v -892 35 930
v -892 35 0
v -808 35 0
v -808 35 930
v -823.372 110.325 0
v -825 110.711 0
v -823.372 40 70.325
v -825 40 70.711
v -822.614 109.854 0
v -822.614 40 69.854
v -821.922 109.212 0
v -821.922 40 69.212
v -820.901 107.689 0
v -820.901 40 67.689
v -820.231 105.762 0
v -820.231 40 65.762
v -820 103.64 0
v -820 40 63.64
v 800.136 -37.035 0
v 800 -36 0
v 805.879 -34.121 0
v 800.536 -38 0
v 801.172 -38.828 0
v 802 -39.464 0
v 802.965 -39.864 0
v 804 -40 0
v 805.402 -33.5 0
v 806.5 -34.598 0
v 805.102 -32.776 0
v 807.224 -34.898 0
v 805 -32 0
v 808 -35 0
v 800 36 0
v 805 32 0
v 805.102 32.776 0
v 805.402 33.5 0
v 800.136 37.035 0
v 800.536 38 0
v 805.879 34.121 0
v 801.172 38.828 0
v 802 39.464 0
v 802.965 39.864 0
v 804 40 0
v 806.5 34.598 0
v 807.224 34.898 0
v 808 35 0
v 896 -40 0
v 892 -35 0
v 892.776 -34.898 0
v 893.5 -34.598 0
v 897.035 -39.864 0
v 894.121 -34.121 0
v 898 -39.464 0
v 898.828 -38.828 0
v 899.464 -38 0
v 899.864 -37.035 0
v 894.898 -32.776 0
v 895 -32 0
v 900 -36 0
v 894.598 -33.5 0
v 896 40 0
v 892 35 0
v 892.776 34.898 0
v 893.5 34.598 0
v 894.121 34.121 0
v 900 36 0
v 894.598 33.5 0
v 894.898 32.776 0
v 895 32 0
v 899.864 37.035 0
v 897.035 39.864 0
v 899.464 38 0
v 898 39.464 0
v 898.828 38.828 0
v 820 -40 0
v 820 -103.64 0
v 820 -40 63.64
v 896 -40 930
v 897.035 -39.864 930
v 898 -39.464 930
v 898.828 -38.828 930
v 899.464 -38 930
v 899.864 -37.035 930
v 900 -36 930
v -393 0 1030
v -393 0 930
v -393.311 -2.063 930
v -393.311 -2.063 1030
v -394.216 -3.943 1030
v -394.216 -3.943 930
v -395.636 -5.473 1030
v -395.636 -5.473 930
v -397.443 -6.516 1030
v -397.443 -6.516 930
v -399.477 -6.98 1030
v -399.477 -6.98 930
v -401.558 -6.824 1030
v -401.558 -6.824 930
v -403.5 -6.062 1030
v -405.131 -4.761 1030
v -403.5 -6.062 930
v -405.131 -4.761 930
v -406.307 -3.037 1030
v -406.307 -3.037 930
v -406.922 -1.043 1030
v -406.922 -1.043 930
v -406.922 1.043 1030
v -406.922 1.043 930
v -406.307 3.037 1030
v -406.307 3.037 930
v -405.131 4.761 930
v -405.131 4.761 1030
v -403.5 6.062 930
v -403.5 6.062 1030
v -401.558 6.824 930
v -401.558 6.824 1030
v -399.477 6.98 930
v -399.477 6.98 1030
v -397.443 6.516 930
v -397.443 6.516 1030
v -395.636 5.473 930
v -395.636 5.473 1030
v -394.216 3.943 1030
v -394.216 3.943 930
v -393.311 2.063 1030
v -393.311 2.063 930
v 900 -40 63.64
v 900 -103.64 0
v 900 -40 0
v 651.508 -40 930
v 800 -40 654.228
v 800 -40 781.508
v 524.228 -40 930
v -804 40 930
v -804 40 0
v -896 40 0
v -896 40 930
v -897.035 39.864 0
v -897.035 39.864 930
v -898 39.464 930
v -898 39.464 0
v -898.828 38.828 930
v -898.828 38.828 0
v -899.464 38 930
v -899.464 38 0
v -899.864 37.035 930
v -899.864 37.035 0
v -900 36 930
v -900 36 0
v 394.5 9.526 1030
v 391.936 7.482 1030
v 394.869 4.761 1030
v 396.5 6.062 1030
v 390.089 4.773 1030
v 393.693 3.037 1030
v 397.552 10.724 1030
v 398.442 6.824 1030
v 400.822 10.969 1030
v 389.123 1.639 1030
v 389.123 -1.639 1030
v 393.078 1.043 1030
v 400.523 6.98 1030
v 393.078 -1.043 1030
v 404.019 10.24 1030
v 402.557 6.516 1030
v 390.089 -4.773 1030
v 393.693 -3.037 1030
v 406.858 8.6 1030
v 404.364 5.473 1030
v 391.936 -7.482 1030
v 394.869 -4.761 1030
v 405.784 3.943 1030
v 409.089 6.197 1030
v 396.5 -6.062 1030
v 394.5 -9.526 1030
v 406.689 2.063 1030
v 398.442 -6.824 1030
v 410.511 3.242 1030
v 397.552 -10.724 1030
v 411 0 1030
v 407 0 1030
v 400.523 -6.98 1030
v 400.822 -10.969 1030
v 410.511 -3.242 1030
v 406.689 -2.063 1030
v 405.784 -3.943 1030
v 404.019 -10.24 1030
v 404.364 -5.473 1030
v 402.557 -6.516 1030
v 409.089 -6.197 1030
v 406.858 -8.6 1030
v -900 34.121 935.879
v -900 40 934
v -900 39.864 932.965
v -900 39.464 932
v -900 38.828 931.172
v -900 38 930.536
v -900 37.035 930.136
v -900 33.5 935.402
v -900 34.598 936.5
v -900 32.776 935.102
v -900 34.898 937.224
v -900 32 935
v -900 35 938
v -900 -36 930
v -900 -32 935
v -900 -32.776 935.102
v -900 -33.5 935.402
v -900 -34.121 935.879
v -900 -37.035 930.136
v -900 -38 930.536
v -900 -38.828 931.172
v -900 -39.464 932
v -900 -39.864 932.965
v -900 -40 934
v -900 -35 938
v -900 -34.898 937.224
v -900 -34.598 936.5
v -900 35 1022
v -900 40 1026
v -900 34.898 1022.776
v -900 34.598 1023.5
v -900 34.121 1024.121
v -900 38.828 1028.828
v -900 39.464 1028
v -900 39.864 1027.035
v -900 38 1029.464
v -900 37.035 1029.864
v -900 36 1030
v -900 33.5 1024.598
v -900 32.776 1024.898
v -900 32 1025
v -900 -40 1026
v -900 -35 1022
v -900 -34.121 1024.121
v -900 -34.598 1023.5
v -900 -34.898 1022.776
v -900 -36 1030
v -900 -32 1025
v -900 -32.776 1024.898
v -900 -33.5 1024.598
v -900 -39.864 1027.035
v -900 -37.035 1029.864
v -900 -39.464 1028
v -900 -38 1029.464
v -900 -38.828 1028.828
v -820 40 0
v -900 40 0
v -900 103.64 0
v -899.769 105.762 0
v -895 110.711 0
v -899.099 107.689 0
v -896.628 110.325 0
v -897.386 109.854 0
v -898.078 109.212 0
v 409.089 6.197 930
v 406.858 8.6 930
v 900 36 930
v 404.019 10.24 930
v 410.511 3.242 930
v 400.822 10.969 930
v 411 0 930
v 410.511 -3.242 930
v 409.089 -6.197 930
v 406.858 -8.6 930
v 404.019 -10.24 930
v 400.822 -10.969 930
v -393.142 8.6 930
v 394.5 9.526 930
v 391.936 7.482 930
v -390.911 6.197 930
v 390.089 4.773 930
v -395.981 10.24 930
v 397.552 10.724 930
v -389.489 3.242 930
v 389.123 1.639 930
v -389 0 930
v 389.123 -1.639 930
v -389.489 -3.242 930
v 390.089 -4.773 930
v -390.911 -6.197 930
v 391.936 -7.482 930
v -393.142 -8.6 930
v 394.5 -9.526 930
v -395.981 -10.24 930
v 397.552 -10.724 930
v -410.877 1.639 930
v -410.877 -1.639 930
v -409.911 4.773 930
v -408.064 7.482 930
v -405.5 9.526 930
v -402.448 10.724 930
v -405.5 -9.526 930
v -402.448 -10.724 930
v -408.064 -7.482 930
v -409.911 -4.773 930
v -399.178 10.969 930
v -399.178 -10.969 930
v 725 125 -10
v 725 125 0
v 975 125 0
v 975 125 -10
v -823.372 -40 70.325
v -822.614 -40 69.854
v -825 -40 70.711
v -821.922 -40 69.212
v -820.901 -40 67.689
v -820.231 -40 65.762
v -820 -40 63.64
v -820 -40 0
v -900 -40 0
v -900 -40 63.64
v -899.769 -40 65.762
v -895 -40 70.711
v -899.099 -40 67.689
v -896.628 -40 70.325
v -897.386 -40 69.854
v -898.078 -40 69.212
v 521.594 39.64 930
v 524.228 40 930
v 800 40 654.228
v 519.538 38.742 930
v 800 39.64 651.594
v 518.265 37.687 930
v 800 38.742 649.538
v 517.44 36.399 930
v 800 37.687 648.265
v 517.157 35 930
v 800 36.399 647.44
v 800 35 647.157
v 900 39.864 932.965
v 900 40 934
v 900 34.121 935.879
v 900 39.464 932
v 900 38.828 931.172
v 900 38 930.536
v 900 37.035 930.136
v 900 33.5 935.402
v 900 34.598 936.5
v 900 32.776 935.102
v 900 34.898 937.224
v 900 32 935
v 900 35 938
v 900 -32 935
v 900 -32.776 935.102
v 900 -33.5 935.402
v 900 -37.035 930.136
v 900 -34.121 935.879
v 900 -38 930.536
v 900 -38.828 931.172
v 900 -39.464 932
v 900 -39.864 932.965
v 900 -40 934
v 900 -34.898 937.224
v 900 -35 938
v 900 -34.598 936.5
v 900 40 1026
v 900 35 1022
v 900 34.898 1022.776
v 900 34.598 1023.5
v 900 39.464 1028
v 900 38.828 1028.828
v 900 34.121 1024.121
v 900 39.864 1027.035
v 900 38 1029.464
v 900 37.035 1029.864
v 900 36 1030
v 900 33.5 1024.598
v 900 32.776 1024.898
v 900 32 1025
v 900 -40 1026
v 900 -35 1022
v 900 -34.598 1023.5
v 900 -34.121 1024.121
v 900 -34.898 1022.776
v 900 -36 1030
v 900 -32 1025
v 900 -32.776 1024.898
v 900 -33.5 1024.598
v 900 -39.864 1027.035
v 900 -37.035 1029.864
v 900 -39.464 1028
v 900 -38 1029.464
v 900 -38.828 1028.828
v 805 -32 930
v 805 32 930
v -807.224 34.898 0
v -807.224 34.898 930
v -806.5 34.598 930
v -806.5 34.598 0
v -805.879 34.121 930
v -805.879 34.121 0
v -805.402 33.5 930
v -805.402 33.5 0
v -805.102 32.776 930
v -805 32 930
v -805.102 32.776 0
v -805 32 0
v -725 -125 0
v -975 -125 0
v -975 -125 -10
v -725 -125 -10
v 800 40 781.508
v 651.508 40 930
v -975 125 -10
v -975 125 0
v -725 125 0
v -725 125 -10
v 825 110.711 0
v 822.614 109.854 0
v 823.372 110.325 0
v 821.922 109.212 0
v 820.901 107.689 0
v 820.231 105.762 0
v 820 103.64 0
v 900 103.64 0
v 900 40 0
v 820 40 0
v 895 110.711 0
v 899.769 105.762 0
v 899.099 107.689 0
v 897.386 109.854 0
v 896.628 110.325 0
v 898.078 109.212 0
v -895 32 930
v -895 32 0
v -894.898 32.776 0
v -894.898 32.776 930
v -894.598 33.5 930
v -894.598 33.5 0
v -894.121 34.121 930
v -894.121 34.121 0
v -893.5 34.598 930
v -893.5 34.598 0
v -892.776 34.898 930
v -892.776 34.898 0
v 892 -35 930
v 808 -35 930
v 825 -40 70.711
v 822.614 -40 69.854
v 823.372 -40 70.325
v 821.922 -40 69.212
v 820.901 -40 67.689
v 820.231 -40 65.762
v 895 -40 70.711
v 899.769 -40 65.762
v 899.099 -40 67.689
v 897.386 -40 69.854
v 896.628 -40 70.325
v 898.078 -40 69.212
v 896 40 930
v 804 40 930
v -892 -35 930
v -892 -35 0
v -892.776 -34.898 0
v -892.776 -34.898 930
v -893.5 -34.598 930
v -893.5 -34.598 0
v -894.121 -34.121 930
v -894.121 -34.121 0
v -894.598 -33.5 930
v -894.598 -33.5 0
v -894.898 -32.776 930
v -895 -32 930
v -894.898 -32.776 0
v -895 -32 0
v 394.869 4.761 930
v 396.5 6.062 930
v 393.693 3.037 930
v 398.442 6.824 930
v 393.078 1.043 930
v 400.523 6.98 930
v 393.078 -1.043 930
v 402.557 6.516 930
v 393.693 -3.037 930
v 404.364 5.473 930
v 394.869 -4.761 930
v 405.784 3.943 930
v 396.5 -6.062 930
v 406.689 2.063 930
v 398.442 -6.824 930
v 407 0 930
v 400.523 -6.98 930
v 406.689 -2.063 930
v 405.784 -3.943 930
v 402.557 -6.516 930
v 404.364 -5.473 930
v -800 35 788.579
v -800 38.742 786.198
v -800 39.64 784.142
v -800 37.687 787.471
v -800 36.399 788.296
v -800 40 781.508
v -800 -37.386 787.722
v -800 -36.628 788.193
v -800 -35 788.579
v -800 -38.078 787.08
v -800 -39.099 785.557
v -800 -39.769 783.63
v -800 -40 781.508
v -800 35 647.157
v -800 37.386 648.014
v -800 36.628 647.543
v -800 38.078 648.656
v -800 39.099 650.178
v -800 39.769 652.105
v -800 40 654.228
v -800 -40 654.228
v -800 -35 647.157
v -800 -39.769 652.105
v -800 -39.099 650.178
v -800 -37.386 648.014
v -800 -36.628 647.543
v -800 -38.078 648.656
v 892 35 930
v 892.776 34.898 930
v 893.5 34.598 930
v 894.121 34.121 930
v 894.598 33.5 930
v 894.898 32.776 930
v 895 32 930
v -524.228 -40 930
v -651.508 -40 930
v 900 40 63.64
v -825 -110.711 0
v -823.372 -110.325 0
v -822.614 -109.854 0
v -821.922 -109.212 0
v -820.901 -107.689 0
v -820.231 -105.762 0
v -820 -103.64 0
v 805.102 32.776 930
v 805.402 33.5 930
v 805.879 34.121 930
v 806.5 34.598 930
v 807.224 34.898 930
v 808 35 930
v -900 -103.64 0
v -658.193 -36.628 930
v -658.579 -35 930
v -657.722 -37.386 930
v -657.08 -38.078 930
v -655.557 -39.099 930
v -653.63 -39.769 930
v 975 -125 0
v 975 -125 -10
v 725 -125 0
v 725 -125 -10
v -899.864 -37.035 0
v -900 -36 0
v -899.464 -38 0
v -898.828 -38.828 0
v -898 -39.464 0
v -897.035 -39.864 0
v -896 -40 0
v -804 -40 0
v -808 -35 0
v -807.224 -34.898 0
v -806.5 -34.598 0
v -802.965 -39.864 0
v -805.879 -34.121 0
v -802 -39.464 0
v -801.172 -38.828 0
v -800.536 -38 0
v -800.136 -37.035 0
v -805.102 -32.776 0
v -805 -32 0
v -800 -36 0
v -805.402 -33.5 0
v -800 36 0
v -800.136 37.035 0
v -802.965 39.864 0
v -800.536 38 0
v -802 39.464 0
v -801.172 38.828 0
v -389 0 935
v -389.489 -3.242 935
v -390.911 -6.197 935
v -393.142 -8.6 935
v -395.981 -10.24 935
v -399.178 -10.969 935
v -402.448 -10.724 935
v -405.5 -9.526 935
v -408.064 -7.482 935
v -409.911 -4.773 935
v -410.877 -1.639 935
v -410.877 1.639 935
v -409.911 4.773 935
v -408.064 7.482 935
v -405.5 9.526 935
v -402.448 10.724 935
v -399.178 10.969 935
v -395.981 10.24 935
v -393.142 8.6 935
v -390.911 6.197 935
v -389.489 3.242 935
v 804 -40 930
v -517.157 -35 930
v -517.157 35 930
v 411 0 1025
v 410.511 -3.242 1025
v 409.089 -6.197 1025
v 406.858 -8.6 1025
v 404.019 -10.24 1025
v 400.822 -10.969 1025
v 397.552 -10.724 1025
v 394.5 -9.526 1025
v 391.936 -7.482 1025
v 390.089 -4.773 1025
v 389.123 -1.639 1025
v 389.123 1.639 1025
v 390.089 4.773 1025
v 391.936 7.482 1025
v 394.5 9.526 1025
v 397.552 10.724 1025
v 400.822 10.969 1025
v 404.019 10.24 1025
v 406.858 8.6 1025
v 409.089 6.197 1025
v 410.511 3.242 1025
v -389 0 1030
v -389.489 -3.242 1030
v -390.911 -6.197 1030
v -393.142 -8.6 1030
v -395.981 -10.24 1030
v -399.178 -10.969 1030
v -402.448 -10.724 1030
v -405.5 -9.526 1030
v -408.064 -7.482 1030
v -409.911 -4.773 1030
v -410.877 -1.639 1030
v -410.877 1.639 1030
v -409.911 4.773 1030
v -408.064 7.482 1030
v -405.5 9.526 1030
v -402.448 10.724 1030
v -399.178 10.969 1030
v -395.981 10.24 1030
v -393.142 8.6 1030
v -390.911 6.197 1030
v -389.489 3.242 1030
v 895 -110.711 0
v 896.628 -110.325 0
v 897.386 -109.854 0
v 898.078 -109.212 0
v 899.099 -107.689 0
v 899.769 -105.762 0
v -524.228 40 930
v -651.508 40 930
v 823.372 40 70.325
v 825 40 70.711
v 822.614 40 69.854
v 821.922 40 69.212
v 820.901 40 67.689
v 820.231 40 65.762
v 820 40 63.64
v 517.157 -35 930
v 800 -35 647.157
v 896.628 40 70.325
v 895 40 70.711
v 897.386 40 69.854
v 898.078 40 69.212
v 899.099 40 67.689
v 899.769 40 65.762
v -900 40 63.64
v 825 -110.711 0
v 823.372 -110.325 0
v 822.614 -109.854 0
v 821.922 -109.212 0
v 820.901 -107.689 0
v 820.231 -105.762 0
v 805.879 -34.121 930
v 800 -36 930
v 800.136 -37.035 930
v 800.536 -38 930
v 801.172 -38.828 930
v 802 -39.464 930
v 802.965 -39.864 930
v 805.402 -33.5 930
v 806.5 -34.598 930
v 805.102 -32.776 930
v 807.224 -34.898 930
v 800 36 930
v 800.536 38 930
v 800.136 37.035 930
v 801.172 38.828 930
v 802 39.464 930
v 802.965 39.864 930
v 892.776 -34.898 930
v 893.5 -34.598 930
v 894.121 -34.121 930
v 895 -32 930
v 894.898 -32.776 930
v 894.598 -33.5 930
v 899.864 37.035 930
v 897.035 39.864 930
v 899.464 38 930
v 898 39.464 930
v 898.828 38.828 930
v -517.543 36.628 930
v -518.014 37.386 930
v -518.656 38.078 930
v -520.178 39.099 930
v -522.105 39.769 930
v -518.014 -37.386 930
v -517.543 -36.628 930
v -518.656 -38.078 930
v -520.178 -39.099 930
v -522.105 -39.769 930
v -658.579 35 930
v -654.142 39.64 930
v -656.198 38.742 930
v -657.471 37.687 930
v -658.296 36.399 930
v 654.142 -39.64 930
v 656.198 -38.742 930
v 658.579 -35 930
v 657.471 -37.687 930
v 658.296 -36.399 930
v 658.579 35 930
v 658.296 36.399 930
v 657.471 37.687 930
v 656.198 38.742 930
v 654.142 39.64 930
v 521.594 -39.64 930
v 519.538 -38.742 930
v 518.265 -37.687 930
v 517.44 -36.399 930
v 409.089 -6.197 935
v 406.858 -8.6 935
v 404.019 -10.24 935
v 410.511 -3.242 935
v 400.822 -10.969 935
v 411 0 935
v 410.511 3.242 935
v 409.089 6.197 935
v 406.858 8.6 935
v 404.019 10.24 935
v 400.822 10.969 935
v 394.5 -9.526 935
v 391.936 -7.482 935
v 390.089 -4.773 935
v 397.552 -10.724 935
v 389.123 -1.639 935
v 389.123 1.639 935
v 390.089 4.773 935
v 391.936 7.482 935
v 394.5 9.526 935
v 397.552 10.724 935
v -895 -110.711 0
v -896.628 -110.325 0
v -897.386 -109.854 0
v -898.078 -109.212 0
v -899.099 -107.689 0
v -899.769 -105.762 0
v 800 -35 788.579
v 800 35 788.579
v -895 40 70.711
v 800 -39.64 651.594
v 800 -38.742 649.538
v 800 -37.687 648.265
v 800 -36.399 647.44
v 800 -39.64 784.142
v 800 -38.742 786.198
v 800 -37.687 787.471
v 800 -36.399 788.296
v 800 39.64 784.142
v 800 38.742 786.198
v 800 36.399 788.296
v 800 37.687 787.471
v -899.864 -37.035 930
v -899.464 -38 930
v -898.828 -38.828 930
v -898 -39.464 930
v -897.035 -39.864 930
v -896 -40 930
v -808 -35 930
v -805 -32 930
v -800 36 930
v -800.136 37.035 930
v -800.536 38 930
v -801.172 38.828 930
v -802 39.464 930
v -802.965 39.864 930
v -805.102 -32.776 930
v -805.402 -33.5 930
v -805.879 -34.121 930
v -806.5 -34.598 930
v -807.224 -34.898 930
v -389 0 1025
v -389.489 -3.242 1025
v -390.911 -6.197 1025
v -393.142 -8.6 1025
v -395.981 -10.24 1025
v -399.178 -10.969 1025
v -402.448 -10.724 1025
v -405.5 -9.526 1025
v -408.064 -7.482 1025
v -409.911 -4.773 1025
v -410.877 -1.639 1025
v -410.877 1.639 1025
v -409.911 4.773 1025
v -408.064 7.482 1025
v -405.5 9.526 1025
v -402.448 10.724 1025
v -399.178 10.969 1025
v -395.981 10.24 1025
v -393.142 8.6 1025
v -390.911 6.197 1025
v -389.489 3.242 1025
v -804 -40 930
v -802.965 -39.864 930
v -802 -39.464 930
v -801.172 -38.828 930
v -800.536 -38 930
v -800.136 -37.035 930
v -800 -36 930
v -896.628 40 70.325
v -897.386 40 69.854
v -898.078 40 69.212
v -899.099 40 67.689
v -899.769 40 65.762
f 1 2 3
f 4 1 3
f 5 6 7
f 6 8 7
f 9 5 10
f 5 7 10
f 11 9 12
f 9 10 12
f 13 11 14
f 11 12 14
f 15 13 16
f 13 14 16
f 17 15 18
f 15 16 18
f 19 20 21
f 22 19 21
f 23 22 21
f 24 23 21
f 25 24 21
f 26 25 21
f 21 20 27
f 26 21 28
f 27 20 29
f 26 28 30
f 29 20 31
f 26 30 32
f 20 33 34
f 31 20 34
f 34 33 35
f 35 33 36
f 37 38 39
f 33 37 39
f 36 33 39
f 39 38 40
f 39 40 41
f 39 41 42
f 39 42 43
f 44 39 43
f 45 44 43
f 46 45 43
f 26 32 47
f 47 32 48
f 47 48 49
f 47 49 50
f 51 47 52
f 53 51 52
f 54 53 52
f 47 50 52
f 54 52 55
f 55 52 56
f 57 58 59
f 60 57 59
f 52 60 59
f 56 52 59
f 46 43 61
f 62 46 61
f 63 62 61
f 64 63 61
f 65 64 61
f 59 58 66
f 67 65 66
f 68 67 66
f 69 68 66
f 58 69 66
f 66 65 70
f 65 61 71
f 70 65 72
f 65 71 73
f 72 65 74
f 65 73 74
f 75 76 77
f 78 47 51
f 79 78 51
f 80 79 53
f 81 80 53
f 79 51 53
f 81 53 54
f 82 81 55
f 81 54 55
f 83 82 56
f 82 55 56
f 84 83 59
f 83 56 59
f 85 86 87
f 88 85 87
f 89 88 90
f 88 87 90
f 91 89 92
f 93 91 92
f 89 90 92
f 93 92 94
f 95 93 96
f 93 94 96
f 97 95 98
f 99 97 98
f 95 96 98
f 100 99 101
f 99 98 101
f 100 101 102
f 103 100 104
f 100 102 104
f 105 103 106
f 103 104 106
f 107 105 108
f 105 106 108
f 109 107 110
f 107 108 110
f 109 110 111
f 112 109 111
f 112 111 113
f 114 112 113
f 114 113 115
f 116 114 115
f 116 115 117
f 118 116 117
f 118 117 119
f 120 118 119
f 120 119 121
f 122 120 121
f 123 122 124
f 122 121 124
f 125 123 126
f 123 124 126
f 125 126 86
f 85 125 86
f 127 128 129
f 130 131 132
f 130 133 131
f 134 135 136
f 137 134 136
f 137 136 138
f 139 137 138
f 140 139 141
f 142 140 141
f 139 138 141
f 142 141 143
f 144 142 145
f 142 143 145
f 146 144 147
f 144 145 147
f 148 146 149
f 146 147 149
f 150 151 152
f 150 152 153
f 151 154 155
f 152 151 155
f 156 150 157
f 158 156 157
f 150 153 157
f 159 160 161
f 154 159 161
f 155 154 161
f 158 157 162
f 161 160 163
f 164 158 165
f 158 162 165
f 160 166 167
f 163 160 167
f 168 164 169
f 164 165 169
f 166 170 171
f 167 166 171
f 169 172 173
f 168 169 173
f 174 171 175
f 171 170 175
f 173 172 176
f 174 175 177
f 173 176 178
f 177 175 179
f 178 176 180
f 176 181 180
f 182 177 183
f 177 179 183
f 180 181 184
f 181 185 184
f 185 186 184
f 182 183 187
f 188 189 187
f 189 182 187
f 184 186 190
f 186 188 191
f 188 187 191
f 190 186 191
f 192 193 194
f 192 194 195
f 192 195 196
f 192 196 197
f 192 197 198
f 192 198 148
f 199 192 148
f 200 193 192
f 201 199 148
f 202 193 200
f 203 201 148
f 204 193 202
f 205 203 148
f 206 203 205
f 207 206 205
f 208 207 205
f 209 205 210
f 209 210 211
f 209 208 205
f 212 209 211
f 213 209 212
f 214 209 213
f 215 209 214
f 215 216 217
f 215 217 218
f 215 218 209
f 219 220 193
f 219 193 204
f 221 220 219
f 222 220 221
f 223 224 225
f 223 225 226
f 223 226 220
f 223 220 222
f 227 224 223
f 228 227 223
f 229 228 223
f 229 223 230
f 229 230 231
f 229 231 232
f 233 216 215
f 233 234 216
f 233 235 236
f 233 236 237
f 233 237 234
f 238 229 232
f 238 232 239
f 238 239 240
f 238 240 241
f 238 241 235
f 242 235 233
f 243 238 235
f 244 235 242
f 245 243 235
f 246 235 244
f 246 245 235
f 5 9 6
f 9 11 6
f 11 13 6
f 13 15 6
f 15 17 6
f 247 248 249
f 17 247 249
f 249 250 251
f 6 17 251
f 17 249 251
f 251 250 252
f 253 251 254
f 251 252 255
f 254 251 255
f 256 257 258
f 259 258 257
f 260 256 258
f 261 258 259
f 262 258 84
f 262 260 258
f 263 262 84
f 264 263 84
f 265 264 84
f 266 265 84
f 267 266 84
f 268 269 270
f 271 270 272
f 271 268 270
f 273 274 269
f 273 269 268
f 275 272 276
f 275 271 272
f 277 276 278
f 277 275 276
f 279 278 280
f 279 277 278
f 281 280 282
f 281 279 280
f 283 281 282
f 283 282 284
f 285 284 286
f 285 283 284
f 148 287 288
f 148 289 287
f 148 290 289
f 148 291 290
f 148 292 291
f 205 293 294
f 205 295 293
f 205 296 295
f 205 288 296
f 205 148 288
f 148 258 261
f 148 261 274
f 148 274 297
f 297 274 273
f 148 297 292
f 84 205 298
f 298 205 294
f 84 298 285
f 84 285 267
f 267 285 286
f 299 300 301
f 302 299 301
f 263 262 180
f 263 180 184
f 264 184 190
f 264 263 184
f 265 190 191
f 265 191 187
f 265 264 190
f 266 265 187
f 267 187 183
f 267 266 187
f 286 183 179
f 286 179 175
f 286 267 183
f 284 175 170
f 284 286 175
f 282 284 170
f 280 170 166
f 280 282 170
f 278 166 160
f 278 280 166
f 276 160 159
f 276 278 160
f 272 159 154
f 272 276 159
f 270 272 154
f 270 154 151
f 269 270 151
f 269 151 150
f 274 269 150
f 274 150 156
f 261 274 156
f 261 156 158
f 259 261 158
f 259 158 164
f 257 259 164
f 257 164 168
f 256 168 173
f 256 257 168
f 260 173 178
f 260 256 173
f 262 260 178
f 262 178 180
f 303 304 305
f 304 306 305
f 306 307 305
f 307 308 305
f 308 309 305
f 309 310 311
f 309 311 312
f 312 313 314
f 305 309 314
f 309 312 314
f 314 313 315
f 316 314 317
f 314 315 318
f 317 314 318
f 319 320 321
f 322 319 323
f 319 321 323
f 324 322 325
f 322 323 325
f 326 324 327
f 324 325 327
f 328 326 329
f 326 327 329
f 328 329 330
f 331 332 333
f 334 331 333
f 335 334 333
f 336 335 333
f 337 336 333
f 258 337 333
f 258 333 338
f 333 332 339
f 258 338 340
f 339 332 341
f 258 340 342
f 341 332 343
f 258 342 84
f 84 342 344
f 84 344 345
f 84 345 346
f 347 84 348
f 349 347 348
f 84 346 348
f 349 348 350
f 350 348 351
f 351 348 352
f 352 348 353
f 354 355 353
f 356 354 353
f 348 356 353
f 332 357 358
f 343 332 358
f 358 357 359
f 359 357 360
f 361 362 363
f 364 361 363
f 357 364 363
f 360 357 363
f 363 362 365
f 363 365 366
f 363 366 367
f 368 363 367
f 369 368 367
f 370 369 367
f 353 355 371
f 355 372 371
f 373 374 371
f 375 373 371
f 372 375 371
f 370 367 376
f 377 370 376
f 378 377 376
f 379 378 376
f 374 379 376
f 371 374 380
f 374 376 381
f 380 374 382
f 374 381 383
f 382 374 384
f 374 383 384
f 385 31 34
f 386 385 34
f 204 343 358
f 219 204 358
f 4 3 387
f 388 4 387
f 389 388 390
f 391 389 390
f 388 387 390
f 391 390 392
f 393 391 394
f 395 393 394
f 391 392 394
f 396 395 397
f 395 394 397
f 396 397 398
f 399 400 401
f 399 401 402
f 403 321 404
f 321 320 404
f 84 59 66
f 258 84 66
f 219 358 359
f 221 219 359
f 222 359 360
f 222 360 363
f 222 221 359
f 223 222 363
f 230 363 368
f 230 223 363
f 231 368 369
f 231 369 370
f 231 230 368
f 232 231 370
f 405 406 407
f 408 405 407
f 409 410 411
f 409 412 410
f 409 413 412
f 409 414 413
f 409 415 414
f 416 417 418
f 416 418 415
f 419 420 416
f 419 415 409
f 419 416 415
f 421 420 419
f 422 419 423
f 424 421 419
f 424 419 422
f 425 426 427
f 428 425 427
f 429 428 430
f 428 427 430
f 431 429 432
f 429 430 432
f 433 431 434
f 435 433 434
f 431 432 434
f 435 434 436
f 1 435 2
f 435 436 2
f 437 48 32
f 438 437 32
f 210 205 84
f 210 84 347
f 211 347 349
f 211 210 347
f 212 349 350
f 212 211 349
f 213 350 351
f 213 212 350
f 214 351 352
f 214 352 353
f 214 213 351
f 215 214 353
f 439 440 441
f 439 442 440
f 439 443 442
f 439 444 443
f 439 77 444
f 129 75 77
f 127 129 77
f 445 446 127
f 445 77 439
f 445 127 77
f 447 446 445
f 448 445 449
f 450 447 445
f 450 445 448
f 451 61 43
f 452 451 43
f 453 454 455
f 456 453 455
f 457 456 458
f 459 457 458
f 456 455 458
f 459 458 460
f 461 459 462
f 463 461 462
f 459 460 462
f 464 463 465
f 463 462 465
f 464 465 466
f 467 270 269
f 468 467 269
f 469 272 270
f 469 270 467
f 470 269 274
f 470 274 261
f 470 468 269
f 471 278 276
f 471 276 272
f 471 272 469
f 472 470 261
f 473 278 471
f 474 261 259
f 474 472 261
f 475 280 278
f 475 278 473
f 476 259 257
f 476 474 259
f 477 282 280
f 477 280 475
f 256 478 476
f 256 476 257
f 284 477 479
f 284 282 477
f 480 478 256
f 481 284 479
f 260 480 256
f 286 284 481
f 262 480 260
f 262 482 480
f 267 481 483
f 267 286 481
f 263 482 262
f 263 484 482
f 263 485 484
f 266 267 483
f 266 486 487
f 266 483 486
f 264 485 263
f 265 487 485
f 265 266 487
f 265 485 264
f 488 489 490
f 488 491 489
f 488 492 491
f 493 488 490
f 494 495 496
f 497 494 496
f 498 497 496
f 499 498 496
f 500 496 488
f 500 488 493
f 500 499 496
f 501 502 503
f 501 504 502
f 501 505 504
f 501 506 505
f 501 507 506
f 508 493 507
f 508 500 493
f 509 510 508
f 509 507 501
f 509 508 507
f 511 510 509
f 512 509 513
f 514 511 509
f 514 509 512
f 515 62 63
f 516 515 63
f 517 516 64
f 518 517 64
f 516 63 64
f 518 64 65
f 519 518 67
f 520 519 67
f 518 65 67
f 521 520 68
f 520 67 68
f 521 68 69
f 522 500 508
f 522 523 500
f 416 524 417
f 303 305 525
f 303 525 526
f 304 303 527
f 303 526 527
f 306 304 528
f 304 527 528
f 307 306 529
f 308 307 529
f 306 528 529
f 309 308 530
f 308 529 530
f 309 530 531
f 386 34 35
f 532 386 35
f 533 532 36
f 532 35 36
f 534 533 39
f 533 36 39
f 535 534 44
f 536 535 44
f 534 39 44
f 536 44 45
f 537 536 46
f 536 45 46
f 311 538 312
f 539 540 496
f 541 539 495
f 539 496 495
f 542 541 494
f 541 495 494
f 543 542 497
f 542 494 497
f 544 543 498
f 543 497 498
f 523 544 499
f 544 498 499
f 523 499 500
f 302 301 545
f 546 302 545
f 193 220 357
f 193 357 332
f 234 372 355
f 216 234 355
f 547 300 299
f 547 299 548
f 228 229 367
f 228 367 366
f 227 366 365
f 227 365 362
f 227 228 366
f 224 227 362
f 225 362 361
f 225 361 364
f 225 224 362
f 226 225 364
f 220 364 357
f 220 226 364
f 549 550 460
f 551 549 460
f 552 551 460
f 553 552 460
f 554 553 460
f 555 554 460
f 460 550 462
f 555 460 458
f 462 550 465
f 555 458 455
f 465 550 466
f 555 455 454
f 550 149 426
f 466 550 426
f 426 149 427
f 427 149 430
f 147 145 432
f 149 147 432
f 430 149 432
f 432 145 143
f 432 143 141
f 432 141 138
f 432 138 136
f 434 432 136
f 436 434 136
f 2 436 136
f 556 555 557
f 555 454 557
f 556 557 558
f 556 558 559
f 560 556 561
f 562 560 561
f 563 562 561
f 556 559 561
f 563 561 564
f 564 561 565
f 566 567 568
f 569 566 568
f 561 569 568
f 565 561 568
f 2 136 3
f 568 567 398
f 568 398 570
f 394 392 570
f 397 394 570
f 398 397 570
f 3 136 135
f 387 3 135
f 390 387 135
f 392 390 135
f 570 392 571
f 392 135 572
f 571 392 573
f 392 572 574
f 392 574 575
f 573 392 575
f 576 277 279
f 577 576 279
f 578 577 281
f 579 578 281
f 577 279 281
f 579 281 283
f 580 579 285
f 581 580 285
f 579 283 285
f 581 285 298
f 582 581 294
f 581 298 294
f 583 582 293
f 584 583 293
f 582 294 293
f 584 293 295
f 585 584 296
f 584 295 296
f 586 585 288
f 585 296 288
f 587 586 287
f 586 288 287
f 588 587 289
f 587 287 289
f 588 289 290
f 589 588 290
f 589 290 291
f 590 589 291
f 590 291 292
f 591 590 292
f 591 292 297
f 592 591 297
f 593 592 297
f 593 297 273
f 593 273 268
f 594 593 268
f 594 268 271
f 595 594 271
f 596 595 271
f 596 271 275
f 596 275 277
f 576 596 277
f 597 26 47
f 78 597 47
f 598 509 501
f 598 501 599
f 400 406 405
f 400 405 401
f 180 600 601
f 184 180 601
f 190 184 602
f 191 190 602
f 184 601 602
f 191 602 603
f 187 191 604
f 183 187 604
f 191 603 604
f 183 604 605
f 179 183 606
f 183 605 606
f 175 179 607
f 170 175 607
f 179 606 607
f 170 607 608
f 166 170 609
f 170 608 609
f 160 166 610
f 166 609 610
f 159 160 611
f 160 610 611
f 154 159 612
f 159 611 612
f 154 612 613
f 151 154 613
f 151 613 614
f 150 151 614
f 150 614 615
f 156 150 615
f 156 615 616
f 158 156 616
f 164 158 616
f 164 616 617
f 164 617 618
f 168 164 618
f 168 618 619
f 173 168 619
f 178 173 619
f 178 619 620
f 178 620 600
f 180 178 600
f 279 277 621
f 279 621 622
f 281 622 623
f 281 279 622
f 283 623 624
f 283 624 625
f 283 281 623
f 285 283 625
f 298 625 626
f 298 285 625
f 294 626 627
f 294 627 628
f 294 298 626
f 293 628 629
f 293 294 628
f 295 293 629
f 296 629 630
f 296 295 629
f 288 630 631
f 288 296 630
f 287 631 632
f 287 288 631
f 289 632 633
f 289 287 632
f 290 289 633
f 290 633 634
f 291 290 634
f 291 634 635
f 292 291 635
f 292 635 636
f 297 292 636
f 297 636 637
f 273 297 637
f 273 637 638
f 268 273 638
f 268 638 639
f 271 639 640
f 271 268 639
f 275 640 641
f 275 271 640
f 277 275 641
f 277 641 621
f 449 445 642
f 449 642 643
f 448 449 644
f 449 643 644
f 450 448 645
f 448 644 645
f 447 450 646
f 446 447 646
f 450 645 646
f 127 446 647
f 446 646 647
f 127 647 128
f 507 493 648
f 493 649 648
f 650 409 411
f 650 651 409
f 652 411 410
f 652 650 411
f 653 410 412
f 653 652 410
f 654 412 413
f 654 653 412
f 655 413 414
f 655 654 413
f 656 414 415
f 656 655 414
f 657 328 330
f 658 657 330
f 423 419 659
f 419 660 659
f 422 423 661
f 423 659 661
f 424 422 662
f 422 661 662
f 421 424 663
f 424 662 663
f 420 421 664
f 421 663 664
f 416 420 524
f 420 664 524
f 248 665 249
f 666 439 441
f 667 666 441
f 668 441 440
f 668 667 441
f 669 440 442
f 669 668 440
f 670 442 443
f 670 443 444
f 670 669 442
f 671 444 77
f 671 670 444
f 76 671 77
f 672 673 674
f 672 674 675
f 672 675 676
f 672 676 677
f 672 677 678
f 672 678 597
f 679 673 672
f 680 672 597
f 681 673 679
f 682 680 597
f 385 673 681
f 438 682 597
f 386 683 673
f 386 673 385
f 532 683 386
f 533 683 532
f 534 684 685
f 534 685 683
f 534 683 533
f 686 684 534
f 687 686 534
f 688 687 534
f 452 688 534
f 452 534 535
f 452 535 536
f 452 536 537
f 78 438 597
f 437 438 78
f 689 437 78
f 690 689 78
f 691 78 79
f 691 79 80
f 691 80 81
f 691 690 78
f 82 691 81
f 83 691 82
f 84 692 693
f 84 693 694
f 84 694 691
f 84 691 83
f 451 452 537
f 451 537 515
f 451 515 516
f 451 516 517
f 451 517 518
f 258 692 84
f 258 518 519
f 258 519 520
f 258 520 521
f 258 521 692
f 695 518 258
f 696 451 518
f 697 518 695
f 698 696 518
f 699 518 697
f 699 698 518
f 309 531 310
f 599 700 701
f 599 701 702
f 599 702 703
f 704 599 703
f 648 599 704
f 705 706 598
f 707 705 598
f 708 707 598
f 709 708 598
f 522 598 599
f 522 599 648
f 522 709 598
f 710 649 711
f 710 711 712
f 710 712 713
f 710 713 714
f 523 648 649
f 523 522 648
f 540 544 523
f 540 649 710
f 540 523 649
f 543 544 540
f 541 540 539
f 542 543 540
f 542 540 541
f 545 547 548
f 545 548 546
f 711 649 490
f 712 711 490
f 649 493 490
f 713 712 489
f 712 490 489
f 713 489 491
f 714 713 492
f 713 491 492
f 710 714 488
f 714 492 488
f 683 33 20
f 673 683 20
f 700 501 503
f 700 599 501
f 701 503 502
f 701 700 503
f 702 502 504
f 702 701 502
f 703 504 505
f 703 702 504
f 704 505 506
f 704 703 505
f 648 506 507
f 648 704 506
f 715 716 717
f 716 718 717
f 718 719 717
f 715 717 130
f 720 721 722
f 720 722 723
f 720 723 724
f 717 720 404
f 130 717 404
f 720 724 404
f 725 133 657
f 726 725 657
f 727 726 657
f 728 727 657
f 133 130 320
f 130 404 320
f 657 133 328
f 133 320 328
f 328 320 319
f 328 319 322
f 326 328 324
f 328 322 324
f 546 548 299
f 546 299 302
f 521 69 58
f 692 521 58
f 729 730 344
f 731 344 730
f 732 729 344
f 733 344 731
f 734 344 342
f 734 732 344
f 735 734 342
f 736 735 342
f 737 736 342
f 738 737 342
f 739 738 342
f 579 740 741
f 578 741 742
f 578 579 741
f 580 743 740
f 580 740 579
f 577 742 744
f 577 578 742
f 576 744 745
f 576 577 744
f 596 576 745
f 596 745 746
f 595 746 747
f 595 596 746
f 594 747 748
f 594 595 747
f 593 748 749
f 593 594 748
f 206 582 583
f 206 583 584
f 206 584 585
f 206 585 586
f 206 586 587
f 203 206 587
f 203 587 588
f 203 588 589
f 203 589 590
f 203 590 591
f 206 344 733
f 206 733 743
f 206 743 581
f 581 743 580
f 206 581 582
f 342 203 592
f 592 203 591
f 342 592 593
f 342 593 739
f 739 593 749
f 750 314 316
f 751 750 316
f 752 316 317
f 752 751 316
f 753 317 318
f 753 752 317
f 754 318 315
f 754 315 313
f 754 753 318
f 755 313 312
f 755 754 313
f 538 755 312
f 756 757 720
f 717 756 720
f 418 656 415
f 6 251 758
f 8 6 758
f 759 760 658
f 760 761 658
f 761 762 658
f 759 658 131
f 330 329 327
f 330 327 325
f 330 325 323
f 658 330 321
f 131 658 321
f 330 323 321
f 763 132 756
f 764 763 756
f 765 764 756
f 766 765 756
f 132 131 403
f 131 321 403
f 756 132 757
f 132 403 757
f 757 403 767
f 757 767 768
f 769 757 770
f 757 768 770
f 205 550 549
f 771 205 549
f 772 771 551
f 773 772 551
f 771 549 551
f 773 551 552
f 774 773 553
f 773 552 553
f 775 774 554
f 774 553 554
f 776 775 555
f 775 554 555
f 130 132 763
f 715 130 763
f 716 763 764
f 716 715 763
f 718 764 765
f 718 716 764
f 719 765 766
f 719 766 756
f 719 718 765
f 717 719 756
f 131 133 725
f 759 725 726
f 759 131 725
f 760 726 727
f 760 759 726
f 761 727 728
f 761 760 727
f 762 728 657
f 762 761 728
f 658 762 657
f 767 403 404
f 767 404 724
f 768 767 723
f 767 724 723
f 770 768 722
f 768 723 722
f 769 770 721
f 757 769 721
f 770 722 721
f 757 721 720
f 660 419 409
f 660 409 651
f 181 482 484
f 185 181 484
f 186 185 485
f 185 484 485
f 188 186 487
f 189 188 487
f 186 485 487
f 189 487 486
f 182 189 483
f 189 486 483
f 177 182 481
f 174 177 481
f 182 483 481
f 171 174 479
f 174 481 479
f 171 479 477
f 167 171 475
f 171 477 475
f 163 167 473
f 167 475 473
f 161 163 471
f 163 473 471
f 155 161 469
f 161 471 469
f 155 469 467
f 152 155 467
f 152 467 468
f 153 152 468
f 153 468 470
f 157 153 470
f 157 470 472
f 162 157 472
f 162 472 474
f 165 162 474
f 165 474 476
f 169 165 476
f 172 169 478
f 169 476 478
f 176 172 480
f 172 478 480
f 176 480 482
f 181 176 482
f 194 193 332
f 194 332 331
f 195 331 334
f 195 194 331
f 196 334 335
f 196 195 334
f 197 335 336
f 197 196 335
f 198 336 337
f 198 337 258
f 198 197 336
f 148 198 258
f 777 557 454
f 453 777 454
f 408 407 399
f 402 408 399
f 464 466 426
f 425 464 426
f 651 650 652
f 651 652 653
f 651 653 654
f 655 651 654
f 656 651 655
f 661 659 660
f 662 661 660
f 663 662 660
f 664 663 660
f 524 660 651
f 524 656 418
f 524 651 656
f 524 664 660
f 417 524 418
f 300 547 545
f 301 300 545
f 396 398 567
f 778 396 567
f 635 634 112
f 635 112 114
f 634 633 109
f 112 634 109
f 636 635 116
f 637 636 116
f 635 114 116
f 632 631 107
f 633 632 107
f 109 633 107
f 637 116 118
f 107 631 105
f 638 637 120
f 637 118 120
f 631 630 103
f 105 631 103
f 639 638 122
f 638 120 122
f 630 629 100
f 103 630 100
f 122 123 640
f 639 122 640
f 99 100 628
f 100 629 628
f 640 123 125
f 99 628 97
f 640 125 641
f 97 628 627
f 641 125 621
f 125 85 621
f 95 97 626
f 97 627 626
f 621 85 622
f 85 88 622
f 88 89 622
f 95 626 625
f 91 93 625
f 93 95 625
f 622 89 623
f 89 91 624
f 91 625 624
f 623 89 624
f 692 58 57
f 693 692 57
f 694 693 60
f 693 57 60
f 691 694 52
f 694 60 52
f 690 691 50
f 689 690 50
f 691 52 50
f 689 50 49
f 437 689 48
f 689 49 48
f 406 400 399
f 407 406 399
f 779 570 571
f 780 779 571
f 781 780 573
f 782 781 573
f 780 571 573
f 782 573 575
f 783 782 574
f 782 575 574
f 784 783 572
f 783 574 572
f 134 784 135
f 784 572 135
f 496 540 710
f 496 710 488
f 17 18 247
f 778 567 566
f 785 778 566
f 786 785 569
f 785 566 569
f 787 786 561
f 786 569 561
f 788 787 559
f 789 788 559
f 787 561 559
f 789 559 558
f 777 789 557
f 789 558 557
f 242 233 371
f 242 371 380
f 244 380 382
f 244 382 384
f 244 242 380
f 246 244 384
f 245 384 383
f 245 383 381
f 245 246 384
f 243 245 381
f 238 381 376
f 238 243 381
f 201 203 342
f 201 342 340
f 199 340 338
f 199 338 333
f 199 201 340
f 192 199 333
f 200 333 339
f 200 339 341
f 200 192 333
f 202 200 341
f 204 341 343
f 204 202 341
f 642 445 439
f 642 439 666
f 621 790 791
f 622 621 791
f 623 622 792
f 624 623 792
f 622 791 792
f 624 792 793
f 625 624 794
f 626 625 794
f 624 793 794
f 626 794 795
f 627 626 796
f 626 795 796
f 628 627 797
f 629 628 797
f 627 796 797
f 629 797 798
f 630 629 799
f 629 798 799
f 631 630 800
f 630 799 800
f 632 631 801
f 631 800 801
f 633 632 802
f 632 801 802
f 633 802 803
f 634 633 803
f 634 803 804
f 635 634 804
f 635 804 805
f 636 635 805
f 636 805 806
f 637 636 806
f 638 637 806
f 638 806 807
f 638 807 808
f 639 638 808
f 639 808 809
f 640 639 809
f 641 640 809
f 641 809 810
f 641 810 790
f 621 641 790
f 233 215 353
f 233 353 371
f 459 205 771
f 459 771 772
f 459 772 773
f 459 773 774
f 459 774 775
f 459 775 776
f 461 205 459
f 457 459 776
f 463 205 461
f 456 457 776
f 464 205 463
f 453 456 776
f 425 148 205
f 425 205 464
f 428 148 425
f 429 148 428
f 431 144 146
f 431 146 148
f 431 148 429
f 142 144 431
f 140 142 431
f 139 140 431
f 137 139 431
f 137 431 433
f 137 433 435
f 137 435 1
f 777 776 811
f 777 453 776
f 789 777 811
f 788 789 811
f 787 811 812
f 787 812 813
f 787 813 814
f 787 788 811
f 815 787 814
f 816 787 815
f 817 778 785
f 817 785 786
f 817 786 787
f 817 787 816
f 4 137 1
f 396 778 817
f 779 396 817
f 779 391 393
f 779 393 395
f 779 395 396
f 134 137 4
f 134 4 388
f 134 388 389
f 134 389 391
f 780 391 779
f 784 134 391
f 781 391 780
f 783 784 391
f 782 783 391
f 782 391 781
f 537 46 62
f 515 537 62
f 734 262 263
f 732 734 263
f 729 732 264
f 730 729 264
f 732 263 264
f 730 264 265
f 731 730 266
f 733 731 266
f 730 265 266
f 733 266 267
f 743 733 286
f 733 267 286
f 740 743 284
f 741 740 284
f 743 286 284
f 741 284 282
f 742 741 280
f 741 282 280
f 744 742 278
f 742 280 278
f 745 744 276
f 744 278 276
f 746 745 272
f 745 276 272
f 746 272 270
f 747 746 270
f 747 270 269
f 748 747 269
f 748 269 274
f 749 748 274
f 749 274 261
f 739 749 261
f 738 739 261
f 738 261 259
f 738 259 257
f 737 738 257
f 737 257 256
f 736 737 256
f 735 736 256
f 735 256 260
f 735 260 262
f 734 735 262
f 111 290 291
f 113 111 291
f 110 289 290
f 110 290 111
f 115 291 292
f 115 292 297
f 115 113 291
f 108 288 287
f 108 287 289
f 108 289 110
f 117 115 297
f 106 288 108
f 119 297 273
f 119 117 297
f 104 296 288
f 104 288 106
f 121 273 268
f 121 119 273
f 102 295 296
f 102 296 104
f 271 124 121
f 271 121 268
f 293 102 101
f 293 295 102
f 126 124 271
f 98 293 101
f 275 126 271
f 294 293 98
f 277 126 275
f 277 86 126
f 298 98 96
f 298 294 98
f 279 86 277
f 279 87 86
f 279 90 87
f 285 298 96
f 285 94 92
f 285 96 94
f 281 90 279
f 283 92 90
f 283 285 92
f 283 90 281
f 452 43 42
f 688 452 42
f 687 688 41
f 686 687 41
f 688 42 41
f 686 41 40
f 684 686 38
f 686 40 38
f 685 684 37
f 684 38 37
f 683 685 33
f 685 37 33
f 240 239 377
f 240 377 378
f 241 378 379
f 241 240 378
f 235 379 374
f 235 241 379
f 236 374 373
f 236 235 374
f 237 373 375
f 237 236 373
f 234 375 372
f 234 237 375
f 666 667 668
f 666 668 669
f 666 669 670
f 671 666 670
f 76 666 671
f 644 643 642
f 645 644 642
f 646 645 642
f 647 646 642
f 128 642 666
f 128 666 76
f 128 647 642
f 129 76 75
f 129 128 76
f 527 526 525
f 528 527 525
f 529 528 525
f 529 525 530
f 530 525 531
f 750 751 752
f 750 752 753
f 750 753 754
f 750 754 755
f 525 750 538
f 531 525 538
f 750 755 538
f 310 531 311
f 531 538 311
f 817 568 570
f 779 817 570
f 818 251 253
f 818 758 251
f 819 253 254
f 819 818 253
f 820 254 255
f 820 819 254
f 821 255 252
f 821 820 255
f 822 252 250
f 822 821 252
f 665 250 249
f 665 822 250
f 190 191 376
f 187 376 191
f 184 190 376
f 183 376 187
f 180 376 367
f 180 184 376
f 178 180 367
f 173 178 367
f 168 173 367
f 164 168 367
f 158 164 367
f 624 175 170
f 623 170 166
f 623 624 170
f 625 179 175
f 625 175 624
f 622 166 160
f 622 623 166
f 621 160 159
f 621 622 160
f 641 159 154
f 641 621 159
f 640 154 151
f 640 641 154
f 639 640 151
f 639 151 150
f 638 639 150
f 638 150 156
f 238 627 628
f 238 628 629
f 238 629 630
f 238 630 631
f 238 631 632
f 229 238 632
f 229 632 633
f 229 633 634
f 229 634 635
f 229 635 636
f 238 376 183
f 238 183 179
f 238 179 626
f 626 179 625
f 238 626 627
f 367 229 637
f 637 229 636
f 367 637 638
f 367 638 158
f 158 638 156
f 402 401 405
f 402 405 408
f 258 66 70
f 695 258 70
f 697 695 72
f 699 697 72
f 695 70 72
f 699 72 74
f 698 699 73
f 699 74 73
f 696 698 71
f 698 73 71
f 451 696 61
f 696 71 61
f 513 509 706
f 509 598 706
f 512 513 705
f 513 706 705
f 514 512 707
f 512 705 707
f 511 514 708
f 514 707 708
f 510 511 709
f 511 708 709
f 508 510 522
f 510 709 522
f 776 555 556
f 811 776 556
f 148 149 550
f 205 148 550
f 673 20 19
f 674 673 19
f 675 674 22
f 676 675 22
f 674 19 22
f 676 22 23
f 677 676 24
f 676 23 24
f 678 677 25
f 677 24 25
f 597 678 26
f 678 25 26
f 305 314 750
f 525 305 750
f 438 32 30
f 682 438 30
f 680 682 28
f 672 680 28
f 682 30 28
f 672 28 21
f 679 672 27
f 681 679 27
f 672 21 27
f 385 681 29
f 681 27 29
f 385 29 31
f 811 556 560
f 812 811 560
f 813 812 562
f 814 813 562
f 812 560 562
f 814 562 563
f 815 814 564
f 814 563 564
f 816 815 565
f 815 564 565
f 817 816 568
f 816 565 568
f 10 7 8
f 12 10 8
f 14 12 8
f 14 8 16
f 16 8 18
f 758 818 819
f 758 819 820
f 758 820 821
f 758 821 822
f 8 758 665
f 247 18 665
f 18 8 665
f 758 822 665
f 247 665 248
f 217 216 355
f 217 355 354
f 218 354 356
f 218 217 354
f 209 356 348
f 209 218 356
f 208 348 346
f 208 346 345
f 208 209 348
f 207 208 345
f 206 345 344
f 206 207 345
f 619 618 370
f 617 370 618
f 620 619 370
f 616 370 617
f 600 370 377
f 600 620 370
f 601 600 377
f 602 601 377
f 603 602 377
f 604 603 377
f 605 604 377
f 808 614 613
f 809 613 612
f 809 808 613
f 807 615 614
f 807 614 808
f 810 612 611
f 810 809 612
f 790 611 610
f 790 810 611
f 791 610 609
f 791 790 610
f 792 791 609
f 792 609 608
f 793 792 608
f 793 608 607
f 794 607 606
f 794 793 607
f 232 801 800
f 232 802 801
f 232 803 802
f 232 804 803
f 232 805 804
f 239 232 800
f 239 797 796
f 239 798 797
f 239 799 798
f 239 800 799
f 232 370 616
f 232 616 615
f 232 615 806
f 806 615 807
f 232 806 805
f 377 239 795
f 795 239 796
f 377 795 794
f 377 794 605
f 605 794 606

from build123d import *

# Parameters (mm, degrees)
F1_DEPTH  = 930
F3_DEPTH  = 1800
F5_DEPTH  = 40
F6_R      = 5
F7_W      = 250
F7_H      = 250
F8_DEPTH  = 10
F10_DEPTH = 80
F11_R     = 5
F13_R     = 11
F14_DEPTH = 100
F15_R     = 11
F15_R_2   = 7
F16_DEPTH = 100
F17_R     = 5
F18_R     = 5


with BuildPart() as f1:
    # F0 (on Top) → F1 (new body)
    with BuildSketch(Plane.XY):
        with BuildLine():
            Line((-896, -40), (-804, -40))
            ThreePointArc((-804, -40), (-801.171573, -38.828427), (-800, -36))
            Line((-800, -36), (-800, 36))
            ThreePointArc((-800, 36), (-801.171573, 38.828427), (-804, 40))
            Line((-804, 40), (-896, 40))
            ThreePointArc((-896, 40), (-898.828427, 38.828427), (-900, 36))
            Line((-900, 36), (-900, -36))
            ThreePointArc((-900, -36), (-898.828427, -38.828427), (-896, -40))
        make_face()
        with BuildLine():
            ThreePointArc((-805, -32), (-805.87868, -34.12132), (-808, -35))
            Line((-808, -35), (-892, -35))
            ThreePointArc((-892, -35), (-894.12132, -34.12132), (-895, -32))
            Line((-895, -32), (-895, 32))
            ThreePointArc((-895, 32), (-894.12132, 34.12132), (-892, 35))
            Line((-892, 35), (-808, 35))
            ThreePointArc((-808, 35), (-805.87868, 34.12132), (-805, 32))
            Line((-805, 32), (-805, -32))
        make_face(mode=Mode.SUBTRACT)
        with BuildLine():
            ThreePointArc((804, 40), (801.171573, 38.828427), (800, 36))
            Line((800, 36), (800, -36))
            ThreePointArc((800, -36), (801.171573, -38.828427), (804, -40))
            Line((804, -40), (896, -40))
            ThreePointArc((896, -40), (898.828427, -38.828427), (900, -36))
            Line((900, -36), (900, 36))
            ThreePointArc((900, 36), (898.828427, 38.828427), (896, 40))
            Line((896, 40), (804, 40))
        make_face()
        with BuildLine():
            Line((892, -35), (808, -35))
            ThreePointArc((808, -35), (805.87868, -34.12132), (805, -32))
            Line((805, -32), (805, 32))
            ThreePointArc((805, 32), (805.87868, 34.12132), (808, 35))
            Line((808, 35), (892, 35))
            ThreePointArc((892, 35), (894.12132, 34.12132), (895, 32))
            Line((895, 32), (895, -32))
            ThreePointArc((895, -32), (894.12132, -34.12132), (892, -35))
        make_face(mode=Mode.SUBTRACT)
    extrude(amount=F1_DEPTH)


with BuildPart() as f3:
    # F2 (on face) → F3 (new body)
    with BuildSketch(Plane(origin=(-900, 0, 0), x_dir=(0, -1, 0), z_dir=(-1, 0, 0))):
        with BuildLine():
            Line((-36, 930), (36, 930))
            ThreePointArc((36, 930), (38.828427, 931.171573), (40, 934))
            Line((40, 934), (40, 1026))
            ThreePointArc((40, 1026), (38.828427, 1028.828427), (36, 1030))
            Line((36, 1030), (-36, 1030))
            ThreePointArc((-36, 1030), (-38.828427, 1028.828427), (-40, 1026))
            Line((-40, 1026), (-40, 934))
            ThreePointArc((-40, 934), (-38.828427, 931.171573), (-36, 930))
        make_face()
        with BuildLine():
            ThreePointArc((35, 938), (34.12132, 935.87868), (32, 935))
            Line((32, 935), (-32, 935))
            ThreePointArc((-32, 935), (-34.12132, 935.87868), (-35, 938))
            Line((-35, 938), (-35, 1022))
            ThreePointArc((-35, 1022), (-34.12132, 1024.12132), (-32, 1025))
            Line((-32, 1025), (32, 1025))
            ThreePointArc((32, 1025), (34.12132, 1024.12132), (35, 1022))
            Line((35, 1022), (35, 938))
        make_face(mode=Mode.SUBTRACT)
    extrude(amount=-F3_DEPTH)

    # F13 (on face) → F14 (cut)
    with BuildSketch(Plane(origin=(0, 0, 930), x_dir=(1, 0, 0), z_dir=(0, 0, -1))):
        with Locations((-400, 0)):
            Circle(F13_R)
        with Locations((400, 0)):
            Circle(F13_R)
    extrude(amount=-F14_DEPTH, mode=Mode.SUBTRACT)


with BuildPart() as f5:
    # F4 (on Front) → F5 (new body, symmetric)
    with BuildSketch(Plane.XZ):
        Polygon((800, 647.157288), (800, 788.578644), (658.578644, 930), (517.157288, 930), align=None)
        Polygon((-658.578644, 930), (-800, 788.578644), (-800, 647.157288), (-517.157288, 930), align=None)
    extrude(amount=F5_DEPTH, both=True)

    # F6
    f6_edges = [f5.edges().sort_by_distance(p)[0] for p in [
        (658.578644, 40, 788.578644),
        (658.578644, -40, 788.578644),
        (-658.578644, 40, 788.578644),
        (-658.578644, -40, 788.578644),
    ]]
    fillet(f6_edges, radius=F6_R)

    # F17
    f17_edges = [f5.edges().sort_by_distance(p)[0] for p in [
        (-729.289322, -40, 859.289322),
        (-729.289322, 40, 859.289322),
    ]]
    fillet(f17_edges, radius=F17_R)

    # F18
    f18_edges = [f5.edges().sort_by_distance(p)[0] for p in [
        (729.289322, 40, 859.289322),
        (729.289322, -40, 859.289322),
    ]]
    fillet(f18_edges, radius=F18_R)


with BuildPart() as f8:
    # F7 (on face) → F8 (new body)
    with BuildSketch(Plane(origin=(0, 0, 0), x_dir=(1, 0, 0), z_dir=(0, 0, -1))):
        with Locations((850, 0)):
            Rectangle(F7_W, F7_H)
        with Locations((-850, 0)):
            Rectangle(F7_W, F7_H)
    extrude(amount=F8_DEPTH)


with BuildPart() as f10:
    # F9 (on face) → F10 (new body)
    with BuildSketch(Plane.YZ.offset(900)):
        Polygon((-40, 0), (-40, 70.710678), (-110.710678, 0), align=None)
        Polygon((110.710678, 0), (40, 70.710678), (40, 0), align=None)
    extrude(amount=-F10_DEPTH)

    # F11
    f11_edges = [f10.edges().sort_by_distance(p)[0] for p in [
        (900, 75.355339, 35.355339),
        (820, 75.355339, 35.355339),
        (900, -75.355339, 35.355339),
        (820, -75.355339, 35.355339),
    ]]
    fillet(f11_edges, radius=F11_R)


with BuildPart() as f12_1:
    # F12: instance of F10
    add(f10.part.mirror(Plane.YZ))


with BuildPart() as f16:
    # F15 (on face) → F16 (new body)
    with BuildSketch(Plane(origin=(0, 0, 930), x_dir=(1, 0, 0), z_dir=(0, 0, -1))):
        with Locations((-400, 0)):
            Circle(F15_R)
        with Locations((-400, 0)):
            Circle(F15_R_2, mode=Mode.SUBTRACT)
        with Locations((400, 0)):
            Circle(F15_R)
        with Locations((400, 0)):
            Circle(F15_R_2, mode=Mode.SUBTRACT)
    extrude(amount=-F16_DEPTH)


solid = Compound([f1.part, f3.part, f5.part, f8.part, f10.part, f12_1.part, f16.part])
